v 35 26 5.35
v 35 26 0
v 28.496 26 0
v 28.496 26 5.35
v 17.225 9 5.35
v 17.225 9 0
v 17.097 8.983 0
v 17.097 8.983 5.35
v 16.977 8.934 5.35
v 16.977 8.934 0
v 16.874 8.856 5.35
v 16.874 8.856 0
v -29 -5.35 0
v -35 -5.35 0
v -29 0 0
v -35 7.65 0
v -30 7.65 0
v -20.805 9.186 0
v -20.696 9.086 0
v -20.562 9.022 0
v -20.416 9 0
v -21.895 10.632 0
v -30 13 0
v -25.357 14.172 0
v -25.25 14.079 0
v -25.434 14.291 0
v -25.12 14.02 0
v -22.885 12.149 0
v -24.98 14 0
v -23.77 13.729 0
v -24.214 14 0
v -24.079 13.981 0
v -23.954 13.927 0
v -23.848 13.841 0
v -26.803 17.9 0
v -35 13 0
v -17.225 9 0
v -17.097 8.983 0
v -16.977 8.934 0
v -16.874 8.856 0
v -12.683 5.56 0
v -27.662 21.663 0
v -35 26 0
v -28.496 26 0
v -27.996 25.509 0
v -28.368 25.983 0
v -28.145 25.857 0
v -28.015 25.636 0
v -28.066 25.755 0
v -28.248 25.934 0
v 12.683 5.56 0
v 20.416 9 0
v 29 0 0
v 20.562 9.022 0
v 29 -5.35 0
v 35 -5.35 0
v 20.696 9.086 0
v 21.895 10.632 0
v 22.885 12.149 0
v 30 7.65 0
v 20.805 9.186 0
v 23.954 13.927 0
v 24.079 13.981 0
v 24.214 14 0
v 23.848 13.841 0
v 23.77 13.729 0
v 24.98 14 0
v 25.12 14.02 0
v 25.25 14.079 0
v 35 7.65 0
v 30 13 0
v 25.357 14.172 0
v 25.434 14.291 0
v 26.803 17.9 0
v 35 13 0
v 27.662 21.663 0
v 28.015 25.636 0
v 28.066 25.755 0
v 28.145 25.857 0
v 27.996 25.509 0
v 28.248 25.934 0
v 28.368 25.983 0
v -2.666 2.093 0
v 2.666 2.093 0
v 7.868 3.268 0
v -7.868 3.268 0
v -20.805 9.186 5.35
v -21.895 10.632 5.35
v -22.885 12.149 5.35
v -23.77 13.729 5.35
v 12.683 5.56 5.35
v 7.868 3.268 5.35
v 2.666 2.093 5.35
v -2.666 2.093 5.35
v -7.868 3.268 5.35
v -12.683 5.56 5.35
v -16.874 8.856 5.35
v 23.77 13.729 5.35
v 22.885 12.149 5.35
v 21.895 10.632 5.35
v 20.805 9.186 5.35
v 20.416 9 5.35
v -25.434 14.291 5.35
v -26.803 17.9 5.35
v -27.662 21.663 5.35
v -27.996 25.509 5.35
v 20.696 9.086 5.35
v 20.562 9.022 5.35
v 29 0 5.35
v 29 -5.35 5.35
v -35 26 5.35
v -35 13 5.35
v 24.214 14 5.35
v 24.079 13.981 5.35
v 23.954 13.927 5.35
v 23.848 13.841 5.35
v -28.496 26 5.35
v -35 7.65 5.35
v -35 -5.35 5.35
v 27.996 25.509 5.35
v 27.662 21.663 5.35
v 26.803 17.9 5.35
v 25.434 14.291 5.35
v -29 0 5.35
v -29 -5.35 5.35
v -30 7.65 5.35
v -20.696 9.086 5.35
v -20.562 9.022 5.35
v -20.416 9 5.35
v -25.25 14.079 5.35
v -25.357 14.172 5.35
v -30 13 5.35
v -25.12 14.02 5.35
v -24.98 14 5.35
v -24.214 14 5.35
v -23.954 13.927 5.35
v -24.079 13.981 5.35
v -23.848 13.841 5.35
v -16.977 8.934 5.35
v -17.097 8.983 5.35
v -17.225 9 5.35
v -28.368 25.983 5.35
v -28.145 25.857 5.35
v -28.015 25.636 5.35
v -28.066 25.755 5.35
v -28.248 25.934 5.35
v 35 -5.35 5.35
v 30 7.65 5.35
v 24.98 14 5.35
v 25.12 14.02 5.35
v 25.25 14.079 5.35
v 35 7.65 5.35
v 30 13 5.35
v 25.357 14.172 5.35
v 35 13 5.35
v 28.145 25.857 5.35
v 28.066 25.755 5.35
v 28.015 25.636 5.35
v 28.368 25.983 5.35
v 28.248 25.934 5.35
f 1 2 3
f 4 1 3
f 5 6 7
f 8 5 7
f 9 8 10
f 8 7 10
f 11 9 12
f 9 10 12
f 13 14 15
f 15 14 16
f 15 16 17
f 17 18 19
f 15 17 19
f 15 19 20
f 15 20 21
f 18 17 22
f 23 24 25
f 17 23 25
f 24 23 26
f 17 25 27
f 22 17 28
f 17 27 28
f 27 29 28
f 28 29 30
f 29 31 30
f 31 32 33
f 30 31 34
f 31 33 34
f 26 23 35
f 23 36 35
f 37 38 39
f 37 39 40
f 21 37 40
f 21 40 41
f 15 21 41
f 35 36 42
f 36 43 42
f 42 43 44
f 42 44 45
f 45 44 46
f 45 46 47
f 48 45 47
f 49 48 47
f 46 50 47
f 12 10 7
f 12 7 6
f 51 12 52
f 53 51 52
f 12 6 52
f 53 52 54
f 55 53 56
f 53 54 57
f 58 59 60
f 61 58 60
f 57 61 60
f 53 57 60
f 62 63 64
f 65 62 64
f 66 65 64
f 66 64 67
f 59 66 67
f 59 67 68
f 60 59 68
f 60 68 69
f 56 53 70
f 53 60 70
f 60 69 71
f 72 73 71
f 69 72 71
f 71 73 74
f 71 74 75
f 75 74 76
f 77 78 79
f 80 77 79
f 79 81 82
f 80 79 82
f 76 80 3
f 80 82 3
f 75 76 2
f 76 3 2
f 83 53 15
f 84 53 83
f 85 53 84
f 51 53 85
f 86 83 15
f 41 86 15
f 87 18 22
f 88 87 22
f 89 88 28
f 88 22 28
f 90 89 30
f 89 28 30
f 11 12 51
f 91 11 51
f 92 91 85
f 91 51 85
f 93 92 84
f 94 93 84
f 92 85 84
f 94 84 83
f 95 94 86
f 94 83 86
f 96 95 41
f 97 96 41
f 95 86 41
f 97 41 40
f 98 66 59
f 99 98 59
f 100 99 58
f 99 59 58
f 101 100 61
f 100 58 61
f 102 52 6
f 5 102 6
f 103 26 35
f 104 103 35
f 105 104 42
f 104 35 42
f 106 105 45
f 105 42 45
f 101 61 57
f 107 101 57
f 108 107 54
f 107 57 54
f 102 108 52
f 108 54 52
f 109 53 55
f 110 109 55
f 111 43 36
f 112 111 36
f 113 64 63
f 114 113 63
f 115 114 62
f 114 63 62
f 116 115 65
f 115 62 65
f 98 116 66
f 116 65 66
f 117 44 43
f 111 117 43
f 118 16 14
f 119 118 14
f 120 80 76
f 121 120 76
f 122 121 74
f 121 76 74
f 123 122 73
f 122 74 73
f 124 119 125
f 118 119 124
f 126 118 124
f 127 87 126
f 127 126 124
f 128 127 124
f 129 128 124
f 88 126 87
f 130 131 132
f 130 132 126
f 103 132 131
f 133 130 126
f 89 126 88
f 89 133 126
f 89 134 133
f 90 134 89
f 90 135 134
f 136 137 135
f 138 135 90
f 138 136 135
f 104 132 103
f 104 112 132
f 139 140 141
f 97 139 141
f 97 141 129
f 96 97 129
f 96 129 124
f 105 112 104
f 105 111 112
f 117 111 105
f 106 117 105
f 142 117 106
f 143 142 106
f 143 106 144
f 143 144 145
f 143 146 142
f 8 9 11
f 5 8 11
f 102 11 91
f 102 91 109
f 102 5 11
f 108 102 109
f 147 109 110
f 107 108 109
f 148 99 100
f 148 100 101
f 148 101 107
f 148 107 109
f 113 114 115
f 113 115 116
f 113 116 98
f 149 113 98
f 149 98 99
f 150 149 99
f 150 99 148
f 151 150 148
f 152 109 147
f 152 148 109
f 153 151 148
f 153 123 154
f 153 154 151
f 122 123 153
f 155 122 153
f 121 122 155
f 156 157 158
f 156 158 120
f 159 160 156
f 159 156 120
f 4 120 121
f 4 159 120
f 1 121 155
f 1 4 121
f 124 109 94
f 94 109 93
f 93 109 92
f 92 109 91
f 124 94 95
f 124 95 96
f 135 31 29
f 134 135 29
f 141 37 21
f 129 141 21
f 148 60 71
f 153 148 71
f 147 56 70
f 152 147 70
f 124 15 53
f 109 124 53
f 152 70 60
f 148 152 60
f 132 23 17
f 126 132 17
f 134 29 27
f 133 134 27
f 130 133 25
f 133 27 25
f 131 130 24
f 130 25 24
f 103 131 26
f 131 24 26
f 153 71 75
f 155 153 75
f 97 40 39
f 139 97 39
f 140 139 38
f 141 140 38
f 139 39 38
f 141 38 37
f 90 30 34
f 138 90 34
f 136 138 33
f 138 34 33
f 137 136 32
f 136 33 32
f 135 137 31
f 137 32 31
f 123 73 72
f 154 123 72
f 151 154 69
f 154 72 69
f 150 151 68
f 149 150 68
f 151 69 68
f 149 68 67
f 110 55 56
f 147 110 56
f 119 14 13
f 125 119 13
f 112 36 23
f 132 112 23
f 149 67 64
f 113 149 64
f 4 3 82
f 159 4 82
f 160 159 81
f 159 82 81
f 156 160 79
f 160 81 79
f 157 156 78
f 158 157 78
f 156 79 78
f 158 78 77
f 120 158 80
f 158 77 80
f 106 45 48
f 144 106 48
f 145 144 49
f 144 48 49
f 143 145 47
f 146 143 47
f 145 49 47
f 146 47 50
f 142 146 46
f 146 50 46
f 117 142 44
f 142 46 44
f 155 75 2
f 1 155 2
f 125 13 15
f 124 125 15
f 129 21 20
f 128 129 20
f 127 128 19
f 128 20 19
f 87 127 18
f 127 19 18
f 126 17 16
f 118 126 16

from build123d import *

# Parameters (mm, degrees)
BOSS_EXTRUDE1_DEPTH = 5.35


with BuildPart() as part:
    # Model → Boss-Extrude1 (new body)
    with BuildSketch(Plane.XY):
        with BuildLine():
            Line((-29, 0), (29, 0))
            Line((29, 0), (29, -5.35))
            Line((29, -5.35), (35, -5.35))
            Line((35, -5.35), (35, -1.30660388))
            Line((35, -1.30660388), (35, 7.65))
            Line((35, 7.65), (30, 7.65))
            Line((30, 7.65), (30, 13))
            Line((30, 13), (35, 13))
            Line((35, 13), (35, 26))
            Line((35, 26), (28.495613698, 26))
            ThreePointArc((28.495613698, 26), (28.145175376, 25.856641252), (27.99569065, 25.50877193))
            ThreePointArc((27.99569065, 25.50877193), (27.297393866, 19.766839637), (25.434173666, 14.290909091))
            ThreePointArc((25.434173666, 14.290909091), (25.249671939, 14.078962321), (24.979991994, 14))
            Line((24.979991994, 14), (24.213890642, 14))
            ThreePointArc((24.213890642, 14), (23.953774224, 13.927012236), (23.76959907, 13.729357798))
            ThreePointArc((23.76959907, 13.729357798), (22.402719166, 11.382179575), (20.804862314, 9.185714286))
            ThreePointArc((20.804862314, 9.185714286), (20.631459285, 9.048811094), (20.415986383, 9))
            Line((20.415986383, 9), (17.224924528, 9))
            ThreePointArc((17.224924528, 9), (17.035413911, 8.962693987), (16.874182835, 8.856342904))
            ThreePointArc((16.874182835, 8.856342904), (0, 1.945), (-16.874182835, 8.856342904))
            ThreePointArc((-16.874182835, 8.856342904), (-17.035413911, 8.962693987), (-17.224924528, 9))
            Line((-17.224924528, 9), (-20.415986383, 9))
            ThreePointArc((-20.415986383, 9), (-20.631459285, 9.048811094), (-20.804862314, 9.185714286))
            ThreePointArc((-20.804862314, 9.185714286), (-22.402719166, 11.382179575), (-23.76959907, 13.729357798))
            ThreePointArc((-23.76959907, 13.729357798), (-23.953774224, 13.927012236), (-24.213890642, 14))
            Line((-24.213890642, 14), (-24.979991994, 14))
            ThreePointArc((-24.979991994, 14), (-25.249671939, 14.078962321), (-25.434173666, 14.290909091))
            ThreePointArc((-25.434173666, 14.290909091), (-27.297393866, 19.766839637), (-27.99569065, 25.50877193))
            ThreePointArc((-27.99569065, 25.50877193), (-28.145175376, 25.856641252), (-28.495613698, 26))
            Line((-28.495613698, 26), (-35, 26))
            Line((-35, 26), (-35, 13))
            Line((-35, 13), (-30, 13))
            Line((-30, 13), (-30, 7.65))
            Line((-30, 7.65), (-35, 7.65))
            Line((-35, 7.65), (-35, -1.30660388))
            Line((-35, -1.30660388), (-35, -5.35))
            Line((-35, -5.35), (-29, -5.35))
            Line((-29, -5.35), (-29, 0))
        make_face()
    extrude(amount=BOSS_EXTRUDE1_DEPTH)


solid = part.part
